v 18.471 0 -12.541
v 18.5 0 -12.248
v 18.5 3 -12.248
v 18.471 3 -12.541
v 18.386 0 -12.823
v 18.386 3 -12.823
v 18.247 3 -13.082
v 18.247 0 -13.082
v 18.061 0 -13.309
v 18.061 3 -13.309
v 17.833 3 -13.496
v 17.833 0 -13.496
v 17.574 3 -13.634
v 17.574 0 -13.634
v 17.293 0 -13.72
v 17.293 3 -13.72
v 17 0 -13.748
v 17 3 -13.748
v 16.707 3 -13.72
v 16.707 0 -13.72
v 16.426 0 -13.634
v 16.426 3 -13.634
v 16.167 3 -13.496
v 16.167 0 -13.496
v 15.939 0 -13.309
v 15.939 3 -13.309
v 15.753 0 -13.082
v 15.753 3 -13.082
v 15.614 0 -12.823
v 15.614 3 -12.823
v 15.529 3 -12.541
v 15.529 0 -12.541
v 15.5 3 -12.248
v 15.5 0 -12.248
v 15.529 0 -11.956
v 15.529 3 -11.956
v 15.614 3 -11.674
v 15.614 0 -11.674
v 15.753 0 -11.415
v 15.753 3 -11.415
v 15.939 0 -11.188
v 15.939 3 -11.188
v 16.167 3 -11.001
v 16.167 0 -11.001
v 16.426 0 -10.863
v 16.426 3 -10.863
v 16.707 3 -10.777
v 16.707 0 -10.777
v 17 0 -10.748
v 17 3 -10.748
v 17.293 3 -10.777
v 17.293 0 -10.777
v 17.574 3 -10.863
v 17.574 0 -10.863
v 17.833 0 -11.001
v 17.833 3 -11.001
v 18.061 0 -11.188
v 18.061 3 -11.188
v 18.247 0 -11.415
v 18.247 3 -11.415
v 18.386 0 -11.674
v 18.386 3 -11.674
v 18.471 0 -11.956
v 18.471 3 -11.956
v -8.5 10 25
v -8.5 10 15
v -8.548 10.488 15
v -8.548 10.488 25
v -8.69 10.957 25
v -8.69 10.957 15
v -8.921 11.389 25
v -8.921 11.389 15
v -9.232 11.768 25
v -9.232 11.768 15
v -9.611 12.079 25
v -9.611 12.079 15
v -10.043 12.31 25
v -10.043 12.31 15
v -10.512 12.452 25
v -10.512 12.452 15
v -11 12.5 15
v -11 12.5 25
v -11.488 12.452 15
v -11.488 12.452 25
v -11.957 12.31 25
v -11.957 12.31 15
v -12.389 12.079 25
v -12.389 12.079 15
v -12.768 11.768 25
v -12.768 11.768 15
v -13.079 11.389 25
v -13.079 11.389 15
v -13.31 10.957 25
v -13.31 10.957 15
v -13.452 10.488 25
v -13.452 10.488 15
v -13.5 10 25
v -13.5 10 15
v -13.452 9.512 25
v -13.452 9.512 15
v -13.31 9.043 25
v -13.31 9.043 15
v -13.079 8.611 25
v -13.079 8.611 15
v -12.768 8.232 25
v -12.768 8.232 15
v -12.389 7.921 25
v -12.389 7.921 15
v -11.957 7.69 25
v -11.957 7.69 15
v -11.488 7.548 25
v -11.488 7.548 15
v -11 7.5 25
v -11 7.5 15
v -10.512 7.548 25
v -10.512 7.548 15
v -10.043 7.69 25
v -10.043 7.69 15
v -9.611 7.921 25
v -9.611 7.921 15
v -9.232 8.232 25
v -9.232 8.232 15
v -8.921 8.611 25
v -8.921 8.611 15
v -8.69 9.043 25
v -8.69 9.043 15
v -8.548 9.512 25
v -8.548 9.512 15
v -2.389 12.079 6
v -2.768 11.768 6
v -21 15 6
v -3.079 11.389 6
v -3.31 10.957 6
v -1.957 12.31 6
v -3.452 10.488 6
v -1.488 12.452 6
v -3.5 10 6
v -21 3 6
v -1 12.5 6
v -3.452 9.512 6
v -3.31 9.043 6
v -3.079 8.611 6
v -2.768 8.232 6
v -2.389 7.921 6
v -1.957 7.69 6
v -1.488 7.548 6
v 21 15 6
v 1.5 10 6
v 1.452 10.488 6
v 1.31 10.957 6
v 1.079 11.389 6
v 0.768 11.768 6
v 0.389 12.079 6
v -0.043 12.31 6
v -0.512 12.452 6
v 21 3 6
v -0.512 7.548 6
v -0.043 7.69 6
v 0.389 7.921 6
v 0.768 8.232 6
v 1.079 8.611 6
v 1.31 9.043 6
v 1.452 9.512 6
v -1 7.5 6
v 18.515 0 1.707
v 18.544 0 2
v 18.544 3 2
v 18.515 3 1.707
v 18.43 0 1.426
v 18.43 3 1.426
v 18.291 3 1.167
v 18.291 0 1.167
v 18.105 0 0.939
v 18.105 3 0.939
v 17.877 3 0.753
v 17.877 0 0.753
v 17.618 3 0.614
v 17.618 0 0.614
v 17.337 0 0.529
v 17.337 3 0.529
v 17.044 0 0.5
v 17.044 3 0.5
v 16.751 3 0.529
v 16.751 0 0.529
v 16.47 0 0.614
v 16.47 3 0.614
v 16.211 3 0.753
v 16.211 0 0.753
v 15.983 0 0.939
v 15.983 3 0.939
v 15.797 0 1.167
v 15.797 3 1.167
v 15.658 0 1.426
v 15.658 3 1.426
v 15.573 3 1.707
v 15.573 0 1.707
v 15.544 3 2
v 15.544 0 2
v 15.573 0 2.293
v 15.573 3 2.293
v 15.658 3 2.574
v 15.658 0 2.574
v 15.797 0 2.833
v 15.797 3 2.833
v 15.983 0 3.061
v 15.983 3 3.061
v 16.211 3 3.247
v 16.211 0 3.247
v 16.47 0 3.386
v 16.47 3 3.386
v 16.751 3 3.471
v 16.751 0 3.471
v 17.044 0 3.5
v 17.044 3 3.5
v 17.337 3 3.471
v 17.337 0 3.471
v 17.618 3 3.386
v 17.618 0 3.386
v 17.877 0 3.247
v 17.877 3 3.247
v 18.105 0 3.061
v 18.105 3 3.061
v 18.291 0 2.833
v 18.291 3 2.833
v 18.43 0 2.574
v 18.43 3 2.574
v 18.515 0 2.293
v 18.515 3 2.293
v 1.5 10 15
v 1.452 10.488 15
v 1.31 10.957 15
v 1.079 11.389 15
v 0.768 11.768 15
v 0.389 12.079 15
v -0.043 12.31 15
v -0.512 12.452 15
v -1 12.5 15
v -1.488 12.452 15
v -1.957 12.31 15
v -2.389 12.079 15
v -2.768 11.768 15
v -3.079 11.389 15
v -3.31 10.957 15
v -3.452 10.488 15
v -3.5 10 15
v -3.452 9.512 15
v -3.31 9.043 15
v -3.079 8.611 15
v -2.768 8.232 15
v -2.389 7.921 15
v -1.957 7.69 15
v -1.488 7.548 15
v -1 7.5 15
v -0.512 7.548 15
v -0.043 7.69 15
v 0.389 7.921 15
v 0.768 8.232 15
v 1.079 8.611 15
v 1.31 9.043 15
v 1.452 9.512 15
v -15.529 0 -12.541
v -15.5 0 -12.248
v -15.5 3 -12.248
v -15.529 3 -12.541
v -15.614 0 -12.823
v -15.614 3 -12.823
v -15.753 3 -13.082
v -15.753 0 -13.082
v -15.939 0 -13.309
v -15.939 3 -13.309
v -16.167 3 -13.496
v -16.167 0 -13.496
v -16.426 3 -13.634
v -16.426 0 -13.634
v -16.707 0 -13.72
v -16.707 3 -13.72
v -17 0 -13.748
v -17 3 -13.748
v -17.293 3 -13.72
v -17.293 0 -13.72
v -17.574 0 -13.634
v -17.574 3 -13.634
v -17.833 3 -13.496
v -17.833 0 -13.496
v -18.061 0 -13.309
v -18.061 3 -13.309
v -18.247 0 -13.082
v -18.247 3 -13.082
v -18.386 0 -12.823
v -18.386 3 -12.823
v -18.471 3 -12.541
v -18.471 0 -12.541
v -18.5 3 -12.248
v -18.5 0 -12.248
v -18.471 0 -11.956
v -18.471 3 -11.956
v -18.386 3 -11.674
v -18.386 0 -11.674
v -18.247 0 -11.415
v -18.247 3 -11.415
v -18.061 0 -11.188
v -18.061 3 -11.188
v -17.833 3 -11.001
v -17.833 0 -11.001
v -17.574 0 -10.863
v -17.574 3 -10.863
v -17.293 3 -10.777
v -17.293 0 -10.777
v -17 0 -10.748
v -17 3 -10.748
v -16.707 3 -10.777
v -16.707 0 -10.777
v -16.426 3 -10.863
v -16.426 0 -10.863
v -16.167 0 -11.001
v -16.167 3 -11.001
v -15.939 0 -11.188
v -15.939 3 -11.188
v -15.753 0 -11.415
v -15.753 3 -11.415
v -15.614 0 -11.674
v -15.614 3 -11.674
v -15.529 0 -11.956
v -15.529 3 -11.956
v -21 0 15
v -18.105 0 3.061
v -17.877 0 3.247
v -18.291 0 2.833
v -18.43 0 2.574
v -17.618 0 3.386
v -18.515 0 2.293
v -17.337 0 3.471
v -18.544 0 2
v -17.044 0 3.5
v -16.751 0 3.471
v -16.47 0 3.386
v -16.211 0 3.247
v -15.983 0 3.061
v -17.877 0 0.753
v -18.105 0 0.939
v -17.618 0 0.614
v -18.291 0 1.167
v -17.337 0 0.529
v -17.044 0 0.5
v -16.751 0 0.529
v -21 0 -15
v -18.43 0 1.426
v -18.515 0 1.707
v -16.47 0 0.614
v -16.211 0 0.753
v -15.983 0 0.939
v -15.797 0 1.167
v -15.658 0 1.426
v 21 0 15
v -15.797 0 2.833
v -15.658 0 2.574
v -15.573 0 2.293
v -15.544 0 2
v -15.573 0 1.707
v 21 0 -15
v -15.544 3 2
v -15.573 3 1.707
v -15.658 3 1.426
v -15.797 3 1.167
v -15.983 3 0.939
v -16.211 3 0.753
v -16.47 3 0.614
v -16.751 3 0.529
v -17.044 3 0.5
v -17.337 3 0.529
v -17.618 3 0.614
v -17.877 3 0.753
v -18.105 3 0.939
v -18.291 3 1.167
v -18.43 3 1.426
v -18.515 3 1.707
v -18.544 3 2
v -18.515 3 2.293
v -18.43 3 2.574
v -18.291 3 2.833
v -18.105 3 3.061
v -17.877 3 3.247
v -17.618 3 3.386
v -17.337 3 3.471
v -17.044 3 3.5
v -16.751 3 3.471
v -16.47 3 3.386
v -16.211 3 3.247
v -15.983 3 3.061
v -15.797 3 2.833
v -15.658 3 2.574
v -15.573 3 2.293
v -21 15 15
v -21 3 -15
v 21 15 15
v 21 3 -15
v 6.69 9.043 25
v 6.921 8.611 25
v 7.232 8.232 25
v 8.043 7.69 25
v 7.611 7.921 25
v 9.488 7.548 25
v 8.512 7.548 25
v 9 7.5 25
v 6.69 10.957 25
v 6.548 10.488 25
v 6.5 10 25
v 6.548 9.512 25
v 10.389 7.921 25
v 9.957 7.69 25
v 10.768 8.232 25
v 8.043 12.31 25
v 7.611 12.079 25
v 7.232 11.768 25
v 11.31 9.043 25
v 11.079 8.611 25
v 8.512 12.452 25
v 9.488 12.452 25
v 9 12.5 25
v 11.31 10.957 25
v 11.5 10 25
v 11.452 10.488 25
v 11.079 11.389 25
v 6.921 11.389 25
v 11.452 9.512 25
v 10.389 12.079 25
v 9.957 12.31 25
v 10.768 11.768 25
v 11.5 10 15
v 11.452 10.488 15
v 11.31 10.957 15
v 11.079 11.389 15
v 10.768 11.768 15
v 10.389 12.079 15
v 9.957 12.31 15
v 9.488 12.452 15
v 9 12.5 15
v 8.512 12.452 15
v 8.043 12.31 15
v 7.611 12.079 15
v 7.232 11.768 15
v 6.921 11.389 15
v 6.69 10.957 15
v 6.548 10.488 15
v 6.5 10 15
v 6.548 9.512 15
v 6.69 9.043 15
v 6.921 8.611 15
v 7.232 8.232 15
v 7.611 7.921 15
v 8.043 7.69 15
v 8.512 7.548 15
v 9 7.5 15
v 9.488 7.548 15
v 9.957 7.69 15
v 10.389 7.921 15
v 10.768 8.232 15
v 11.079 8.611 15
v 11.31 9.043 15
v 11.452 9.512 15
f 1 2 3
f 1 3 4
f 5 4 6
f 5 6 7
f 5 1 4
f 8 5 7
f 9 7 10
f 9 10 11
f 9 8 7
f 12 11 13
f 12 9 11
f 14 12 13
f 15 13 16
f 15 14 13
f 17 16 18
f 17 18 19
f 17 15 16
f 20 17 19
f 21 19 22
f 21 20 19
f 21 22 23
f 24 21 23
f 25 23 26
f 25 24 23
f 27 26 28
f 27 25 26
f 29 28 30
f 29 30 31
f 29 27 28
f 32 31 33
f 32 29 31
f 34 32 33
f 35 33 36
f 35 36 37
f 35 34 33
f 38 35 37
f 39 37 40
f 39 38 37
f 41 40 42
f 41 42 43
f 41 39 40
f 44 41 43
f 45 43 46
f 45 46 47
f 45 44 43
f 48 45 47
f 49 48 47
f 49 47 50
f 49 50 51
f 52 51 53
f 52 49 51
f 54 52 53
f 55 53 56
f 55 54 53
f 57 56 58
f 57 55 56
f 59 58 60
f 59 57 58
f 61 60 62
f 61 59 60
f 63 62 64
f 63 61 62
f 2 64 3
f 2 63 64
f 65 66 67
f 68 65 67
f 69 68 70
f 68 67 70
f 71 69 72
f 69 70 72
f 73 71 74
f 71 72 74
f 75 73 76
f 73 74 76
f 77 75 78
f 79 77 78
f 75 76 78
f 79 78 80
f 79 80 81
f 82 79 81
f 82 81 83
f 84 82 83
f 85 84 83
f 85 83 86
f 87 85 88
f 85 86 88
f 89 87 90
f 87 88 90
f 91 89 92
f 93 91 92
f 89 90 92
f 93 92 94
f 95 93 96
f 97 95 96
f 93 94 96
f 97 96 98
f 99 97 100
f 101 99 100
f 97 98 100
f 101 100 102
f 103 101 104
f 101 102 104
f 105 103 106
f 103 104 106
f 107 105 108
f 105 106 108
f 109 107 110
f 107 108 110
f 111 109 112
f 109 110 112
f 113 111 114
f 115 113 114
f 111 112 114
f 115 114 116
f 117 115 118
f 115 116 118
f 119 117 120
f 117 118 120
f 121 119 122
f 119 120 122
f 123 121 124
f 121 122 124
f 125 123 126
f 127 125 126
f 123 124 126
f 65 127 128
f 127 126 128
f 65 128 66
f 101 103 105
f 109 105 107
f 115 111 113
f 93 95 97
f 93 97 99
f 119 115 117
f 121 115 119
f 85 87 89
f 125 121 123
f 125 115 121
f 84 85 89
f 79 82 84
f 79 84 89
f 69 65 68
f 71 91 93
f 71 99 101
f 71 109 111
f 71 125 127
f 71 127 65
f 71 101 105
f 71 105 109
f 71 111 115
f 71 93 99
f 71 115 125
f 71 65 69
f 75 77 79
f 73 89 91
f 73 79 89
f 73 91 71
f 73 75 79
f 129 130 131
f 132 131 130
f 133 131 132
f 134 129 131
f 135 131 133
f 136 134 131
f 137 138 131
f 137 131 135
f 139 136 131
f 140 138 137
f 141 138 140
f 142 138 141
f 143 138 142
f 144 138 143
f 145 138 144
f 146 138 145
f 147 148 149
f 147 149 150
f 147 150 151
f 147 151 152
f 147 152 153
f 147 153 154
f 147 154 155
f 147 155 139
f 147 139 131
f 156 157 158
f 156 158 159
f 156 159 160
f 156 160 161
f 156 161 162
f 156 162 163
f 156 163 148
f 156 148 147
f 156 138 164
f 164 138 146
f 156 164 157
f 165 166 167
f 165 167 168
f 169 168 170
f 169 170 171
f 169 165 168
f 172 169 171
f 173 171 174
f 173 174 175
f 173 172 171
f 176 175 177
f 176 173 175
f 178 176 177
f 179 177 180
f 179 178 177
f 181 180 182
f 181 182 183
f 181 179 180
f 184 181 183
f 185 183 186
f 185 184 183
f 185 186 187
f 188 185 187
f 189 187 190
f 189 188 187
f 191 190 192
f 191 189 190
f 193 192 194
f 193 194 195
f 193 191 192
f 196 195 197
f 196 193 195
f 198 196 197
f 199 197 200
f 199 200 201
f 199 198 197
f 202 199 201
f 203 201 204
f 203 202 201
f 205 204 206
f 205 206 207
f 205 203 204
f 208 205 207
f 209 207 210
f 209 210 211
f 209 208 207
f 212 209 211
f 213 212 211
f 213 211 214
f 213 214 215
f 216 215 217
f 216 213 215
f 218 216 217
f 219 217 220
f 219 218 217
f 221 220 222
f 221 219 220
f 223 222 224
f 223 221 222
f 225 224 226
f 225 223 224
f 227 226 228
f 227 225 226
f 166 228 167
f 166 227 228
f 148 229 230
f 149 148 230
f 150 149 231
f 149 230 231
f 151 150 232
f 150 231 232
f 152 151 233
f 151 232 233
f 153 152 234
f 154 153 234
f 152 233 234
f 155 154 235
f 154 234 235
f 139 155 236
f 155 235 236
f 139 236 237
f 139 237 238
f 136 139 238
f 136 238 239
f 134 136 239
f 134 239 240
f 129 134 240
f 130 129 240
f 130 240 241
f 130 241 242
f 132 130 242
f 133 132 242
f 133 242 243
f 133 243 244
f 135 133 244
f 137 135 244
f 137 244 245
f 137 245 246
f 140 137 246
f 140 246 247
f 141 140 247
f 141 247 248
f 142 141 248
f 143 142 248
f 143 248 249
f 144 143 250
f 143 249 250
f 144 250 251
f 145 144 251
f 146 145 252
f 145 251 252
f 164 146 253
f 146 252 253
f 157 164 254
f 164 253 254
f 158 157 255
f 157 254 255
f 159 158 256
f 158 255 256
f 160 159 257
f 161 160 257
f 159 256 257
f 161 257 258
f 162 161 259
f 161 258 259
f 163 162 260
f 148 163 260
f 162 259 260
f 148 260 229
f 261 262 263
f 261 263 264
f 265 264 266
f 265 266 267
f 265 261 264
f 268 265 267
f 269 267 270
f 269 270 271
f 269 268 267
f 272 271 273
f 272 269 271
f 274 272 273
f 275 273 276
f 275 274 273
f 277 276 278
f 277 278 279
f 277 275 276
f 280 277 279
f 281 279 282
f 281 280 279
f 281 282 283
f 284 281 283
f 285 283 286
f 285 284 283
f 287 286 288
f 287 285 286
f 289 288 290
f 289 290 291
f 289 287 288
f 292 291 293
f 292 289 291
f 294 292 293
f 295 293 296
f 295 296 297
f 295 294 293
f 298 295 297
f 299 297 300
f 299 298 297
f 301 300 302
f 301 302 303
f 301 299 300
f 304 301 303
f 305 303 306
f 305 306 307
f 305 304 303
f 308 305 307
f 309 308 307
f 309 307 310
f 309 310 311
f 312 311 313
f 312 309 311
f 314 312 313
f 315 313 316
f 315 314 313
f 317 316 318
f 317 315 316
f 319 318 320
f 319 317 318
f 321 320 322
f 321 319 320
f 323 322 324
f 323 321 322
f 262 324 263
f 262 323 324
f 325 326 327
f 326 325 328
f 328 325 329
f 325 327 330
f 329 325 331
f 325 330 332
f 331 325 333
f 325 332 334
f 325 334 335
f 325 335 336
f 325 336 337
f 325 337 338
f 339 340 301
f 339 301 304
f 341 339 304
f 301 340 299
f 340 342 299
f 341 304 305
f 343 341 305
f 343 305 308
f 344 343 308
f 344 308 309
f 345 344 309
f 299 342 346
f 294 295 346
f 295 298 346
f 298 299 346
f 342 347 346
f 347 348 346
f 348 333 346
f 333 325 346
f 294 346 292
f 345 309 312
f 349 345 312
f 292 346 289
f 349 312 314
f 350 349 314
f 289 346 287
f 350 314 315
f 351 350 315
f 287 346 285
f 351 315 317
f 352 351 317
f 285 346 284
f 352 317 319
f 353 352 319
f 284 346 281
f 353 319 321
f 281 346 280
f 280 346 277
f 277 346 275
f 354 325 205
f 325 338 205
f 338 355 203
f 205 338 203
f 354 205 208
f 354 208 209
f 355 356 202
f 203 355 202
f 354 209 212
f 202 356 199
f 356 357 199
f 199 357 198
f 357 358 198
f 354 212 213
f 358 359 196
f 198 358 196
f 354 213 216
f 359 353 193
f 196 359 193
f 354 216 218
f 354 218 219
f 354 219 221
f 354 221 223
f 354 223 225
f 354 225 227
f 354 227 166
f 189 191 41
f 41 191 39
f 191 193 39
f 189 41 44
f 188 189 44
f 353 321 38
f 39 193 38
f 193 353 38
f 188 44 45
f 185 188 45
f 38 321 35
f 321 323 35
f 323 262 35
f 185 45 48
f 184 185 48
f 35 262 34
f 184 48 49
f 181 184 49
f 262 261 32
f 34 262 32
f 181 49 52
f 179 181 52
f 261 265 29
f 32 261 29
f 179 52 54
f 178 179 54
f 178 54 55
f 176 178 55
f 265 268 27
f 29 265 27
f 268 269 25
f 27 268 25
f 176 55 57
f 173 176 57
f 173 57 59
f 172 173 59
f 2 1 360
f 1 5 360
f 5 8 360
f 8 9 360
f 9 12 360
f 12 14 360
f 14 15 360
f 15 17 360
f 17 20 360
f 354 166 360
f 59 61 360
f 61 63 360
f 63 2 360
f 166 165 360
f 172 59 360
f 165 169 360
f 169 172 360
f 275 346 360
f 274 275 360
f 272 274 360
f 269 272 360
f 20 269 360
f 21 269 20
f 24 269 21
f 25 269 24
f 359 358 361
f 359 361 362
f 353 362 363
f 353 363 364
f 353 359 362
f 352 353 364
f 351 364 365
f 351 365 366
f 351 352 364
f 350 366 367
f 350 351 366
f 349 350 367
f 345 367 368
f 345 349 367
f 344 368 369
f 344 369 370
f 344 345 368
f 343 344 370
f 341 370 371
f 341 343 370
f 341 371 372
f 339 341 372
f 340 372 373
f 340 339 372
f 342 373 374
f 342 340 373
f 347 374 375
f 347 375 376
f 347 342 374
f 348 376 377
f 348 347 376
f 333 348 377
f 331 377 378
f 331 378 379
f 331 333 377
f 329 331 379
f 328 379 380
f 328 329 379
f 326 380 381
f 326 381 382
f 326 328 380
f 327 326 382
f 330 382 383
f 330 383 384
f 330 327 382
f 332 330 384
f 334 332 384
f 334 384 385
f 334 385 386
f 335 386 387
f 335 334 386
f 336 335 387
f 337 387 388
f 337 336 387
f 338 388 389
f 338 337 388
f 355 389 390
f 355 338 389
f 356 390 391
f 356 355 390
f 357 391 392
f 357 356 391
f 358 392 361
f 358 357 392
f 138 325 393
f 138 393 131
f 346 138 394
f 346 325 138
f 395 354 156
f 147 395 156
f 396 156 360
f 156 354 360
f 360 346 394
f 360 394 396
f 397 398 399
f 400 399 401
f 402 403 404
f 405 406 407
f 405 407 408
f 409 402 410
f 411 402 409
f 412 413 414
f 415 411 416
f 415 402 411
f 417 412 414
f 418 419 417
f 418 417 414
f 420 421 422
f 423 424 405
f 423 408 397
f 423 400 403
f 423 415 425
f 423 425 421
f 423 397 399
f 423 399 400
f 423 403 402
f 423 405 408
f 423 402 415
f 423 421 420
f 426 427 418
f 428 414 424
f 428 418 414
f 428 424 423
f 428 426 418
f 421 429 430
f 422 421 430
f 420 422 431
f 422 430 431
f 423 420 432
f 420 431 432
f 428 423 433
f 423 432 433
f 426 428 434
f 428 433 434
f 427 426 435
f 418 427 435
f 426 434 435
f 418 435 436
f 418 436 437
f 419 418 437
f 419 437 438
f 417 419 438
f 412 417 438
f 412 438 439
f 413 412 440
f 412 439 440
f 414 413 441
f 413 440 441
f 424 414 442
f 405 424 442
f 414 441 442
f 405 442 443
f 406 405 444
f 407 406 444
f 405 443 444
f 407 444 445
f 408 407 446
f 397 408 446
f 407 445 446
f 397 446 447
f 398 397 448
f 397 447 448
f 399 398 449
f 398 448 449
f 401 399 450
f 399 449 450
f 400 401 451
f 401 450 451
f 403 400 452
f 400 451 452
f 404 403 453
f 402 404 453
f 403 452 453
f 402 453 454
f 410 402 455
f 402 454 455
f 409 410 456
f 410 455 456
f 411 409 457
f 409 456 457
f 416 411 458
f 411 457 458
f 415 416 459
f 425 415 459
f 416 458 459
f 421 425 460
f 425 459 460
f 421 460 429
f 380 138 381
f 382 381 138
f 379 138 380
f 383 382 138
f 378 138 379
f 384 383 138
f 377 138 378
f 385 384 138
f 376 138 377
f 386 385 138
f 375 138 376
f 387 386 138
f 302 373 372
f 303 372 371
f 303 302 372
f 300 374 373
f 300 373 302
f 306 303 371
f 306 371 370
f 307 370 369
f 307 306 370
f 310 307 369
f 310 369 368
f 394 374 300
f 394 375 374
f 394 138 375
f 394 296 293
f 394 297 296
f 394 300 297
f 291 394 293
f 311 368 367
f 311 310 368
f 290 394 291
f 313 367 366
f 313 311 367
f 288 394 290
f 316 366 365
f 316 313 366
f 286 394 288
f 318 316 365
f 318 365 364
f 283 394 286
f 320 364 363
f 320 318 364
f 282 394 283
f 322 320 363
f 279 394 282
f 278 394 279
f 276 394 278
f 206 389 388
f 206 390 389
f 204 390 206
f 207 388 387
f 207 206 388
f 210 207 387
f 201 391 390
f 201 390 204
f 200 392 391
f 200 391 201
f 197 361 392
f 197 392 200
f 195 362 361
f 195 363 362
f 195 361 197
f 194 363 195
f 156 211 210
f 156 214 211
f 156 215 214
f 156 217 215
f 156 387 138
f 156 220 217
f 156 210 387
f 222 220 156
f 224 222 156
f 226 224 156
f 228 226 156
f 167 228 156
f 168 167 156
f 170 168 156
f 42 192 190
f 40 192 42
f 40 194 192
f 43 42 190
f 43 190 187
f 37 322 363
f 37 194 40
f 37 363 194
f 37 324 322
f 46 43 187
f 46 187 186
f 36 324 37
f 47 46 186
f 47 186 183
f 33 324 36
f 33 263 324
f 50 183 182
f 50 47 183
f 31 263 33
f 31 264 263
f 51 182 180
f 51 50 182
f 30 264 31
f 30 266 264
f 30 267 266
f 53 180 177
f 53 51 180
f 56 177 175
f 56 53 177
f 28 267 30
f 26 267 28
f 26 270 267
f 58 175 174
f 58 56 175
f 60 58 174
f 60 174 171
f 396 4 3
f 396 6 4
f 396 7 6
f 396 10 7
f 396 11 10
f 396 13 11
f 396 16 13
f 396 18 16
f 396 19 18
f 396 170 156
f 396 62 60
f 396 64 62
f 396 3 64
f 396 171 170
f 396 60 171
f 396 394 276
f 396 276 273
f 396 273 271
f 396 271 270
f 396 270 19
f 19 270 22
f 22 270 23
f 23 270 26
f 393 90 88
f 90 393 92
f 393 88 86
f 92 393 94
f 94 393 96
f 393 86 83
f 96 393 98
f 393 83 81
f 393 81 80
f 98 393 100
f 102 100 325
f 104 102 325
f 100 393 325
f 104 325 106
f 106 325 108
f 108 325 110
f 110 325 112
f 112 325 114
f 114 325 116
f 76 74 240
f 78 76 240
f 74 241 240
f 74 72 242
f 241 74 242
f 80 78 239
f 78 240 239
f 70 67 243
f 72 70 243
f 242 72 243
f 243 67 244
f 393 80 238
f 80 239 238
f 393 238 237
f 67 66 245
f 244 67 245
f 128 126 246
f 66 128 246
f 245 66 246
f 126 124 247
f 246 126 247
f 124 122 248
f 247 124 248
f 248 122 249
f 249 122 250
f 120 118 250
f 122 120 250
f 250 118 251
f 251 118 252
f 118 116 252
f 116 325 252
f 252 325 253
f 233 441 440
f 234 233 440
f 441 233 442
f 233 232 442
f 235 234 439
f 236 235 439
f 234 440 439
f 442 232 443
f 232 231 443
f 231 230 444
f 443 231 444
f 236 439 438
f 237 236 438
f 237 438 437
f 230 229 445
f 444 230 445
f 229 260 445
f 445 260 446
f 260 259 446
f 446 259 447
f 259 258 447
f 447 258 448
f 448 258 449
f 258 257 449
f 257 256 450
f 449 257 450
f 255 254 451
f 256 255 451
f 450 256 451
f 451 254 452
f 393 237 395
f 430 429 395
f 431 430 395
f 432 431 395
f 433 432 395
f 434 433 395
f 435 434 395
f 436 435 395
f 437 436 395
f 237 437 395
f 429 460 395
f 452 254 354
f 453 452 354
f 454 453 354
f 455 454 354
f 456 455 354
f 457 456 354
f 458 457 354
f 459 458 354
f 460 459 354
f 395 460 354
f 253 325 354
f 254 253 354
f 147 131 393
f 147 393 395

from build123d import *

# Parameters (mm, degrees)
SKETCH1_W           = 42
SKETCH1_H           = 21
SKETCH1_R           = 1.5
BOSS_EXTRUDE1_DEPTH = 3
SKETCH1_3_W         = 42
SKETCH1_3_H         = 9
BOSS_EXTRUDE2_DEPTH = 15
SKETCH2_R           = 2.5
BOSS_EXTRUDE3_DEPTH = 10
SKETCH2_4_R         = 2.5
CUT_EXTRUDE2_DEPTH  = 10


with BuildPart() as part:
    # Sketch1 → Boss-Extrude1 (new body)
    with BuildSketch(Plane(origin=(0, 0, 0), x_dir=(1, 0, 0), z_dir=(0, 1, 0))):
        with Locations((0, 4.5)):
            Rectangle(SKETCH1_W, SKETCH1_H)
        with Locations((-17.044088176, -2)):
            Circle(SKETCH1_R, mode=Mode.SUBTRACT)
        with Locations((17.044088176, -2)):
            Circle(SKETCH1_R, mode=Mode.SUBTRACT)
        with Locations((-17, 12.248496994)):
            Circle(SKETCH1_R, mode=Mode.SUBTRACT)
        with Locations((17, 12.248496994)):
            Circle(SKETCH1_R, mode=Mode.SUBTRACT)
    extrude(amount=BOSS_EXTRUDE1_DEPTH)

    # Sketch1<3> → Boss-Extrude2 (add)
    with BuildSketch(Plane(origin=(0, 0, 0), x_dir=(1, 0, 0), z_dir=(0, 1, 0))):
        with Locations((0, -10.5)):
            Rectangle(SKETCH1_3_W, SKETCH1_3_H)
    extrude(amount=BOSS_EXTRUDE2_DEPTH)

    # Sketch2 → Boss-Extrude3 (add)
    with BuildSketch(Plane.XY.offset(15)):
        with Locations((9, 10)):
            Circle(SKETCH2_R)
        with Locations((-11, 10)):
            Circle(SKETCH2_R)
    extrude(amount=BOSS_EXTRUDE3_DEPTH)

    # Sketch2<4> → Cut-Extrude2 (cut)
    with BuildSketch(Plane.XY.offset(15)):
        with Locations((-1, 10)):
            Circle(SKETCH2_4_R)
    extrude(amount=-CUT_EXTRUDE2_DEPTH, mode=Mode.SUBTRACT)


solid = part.part
